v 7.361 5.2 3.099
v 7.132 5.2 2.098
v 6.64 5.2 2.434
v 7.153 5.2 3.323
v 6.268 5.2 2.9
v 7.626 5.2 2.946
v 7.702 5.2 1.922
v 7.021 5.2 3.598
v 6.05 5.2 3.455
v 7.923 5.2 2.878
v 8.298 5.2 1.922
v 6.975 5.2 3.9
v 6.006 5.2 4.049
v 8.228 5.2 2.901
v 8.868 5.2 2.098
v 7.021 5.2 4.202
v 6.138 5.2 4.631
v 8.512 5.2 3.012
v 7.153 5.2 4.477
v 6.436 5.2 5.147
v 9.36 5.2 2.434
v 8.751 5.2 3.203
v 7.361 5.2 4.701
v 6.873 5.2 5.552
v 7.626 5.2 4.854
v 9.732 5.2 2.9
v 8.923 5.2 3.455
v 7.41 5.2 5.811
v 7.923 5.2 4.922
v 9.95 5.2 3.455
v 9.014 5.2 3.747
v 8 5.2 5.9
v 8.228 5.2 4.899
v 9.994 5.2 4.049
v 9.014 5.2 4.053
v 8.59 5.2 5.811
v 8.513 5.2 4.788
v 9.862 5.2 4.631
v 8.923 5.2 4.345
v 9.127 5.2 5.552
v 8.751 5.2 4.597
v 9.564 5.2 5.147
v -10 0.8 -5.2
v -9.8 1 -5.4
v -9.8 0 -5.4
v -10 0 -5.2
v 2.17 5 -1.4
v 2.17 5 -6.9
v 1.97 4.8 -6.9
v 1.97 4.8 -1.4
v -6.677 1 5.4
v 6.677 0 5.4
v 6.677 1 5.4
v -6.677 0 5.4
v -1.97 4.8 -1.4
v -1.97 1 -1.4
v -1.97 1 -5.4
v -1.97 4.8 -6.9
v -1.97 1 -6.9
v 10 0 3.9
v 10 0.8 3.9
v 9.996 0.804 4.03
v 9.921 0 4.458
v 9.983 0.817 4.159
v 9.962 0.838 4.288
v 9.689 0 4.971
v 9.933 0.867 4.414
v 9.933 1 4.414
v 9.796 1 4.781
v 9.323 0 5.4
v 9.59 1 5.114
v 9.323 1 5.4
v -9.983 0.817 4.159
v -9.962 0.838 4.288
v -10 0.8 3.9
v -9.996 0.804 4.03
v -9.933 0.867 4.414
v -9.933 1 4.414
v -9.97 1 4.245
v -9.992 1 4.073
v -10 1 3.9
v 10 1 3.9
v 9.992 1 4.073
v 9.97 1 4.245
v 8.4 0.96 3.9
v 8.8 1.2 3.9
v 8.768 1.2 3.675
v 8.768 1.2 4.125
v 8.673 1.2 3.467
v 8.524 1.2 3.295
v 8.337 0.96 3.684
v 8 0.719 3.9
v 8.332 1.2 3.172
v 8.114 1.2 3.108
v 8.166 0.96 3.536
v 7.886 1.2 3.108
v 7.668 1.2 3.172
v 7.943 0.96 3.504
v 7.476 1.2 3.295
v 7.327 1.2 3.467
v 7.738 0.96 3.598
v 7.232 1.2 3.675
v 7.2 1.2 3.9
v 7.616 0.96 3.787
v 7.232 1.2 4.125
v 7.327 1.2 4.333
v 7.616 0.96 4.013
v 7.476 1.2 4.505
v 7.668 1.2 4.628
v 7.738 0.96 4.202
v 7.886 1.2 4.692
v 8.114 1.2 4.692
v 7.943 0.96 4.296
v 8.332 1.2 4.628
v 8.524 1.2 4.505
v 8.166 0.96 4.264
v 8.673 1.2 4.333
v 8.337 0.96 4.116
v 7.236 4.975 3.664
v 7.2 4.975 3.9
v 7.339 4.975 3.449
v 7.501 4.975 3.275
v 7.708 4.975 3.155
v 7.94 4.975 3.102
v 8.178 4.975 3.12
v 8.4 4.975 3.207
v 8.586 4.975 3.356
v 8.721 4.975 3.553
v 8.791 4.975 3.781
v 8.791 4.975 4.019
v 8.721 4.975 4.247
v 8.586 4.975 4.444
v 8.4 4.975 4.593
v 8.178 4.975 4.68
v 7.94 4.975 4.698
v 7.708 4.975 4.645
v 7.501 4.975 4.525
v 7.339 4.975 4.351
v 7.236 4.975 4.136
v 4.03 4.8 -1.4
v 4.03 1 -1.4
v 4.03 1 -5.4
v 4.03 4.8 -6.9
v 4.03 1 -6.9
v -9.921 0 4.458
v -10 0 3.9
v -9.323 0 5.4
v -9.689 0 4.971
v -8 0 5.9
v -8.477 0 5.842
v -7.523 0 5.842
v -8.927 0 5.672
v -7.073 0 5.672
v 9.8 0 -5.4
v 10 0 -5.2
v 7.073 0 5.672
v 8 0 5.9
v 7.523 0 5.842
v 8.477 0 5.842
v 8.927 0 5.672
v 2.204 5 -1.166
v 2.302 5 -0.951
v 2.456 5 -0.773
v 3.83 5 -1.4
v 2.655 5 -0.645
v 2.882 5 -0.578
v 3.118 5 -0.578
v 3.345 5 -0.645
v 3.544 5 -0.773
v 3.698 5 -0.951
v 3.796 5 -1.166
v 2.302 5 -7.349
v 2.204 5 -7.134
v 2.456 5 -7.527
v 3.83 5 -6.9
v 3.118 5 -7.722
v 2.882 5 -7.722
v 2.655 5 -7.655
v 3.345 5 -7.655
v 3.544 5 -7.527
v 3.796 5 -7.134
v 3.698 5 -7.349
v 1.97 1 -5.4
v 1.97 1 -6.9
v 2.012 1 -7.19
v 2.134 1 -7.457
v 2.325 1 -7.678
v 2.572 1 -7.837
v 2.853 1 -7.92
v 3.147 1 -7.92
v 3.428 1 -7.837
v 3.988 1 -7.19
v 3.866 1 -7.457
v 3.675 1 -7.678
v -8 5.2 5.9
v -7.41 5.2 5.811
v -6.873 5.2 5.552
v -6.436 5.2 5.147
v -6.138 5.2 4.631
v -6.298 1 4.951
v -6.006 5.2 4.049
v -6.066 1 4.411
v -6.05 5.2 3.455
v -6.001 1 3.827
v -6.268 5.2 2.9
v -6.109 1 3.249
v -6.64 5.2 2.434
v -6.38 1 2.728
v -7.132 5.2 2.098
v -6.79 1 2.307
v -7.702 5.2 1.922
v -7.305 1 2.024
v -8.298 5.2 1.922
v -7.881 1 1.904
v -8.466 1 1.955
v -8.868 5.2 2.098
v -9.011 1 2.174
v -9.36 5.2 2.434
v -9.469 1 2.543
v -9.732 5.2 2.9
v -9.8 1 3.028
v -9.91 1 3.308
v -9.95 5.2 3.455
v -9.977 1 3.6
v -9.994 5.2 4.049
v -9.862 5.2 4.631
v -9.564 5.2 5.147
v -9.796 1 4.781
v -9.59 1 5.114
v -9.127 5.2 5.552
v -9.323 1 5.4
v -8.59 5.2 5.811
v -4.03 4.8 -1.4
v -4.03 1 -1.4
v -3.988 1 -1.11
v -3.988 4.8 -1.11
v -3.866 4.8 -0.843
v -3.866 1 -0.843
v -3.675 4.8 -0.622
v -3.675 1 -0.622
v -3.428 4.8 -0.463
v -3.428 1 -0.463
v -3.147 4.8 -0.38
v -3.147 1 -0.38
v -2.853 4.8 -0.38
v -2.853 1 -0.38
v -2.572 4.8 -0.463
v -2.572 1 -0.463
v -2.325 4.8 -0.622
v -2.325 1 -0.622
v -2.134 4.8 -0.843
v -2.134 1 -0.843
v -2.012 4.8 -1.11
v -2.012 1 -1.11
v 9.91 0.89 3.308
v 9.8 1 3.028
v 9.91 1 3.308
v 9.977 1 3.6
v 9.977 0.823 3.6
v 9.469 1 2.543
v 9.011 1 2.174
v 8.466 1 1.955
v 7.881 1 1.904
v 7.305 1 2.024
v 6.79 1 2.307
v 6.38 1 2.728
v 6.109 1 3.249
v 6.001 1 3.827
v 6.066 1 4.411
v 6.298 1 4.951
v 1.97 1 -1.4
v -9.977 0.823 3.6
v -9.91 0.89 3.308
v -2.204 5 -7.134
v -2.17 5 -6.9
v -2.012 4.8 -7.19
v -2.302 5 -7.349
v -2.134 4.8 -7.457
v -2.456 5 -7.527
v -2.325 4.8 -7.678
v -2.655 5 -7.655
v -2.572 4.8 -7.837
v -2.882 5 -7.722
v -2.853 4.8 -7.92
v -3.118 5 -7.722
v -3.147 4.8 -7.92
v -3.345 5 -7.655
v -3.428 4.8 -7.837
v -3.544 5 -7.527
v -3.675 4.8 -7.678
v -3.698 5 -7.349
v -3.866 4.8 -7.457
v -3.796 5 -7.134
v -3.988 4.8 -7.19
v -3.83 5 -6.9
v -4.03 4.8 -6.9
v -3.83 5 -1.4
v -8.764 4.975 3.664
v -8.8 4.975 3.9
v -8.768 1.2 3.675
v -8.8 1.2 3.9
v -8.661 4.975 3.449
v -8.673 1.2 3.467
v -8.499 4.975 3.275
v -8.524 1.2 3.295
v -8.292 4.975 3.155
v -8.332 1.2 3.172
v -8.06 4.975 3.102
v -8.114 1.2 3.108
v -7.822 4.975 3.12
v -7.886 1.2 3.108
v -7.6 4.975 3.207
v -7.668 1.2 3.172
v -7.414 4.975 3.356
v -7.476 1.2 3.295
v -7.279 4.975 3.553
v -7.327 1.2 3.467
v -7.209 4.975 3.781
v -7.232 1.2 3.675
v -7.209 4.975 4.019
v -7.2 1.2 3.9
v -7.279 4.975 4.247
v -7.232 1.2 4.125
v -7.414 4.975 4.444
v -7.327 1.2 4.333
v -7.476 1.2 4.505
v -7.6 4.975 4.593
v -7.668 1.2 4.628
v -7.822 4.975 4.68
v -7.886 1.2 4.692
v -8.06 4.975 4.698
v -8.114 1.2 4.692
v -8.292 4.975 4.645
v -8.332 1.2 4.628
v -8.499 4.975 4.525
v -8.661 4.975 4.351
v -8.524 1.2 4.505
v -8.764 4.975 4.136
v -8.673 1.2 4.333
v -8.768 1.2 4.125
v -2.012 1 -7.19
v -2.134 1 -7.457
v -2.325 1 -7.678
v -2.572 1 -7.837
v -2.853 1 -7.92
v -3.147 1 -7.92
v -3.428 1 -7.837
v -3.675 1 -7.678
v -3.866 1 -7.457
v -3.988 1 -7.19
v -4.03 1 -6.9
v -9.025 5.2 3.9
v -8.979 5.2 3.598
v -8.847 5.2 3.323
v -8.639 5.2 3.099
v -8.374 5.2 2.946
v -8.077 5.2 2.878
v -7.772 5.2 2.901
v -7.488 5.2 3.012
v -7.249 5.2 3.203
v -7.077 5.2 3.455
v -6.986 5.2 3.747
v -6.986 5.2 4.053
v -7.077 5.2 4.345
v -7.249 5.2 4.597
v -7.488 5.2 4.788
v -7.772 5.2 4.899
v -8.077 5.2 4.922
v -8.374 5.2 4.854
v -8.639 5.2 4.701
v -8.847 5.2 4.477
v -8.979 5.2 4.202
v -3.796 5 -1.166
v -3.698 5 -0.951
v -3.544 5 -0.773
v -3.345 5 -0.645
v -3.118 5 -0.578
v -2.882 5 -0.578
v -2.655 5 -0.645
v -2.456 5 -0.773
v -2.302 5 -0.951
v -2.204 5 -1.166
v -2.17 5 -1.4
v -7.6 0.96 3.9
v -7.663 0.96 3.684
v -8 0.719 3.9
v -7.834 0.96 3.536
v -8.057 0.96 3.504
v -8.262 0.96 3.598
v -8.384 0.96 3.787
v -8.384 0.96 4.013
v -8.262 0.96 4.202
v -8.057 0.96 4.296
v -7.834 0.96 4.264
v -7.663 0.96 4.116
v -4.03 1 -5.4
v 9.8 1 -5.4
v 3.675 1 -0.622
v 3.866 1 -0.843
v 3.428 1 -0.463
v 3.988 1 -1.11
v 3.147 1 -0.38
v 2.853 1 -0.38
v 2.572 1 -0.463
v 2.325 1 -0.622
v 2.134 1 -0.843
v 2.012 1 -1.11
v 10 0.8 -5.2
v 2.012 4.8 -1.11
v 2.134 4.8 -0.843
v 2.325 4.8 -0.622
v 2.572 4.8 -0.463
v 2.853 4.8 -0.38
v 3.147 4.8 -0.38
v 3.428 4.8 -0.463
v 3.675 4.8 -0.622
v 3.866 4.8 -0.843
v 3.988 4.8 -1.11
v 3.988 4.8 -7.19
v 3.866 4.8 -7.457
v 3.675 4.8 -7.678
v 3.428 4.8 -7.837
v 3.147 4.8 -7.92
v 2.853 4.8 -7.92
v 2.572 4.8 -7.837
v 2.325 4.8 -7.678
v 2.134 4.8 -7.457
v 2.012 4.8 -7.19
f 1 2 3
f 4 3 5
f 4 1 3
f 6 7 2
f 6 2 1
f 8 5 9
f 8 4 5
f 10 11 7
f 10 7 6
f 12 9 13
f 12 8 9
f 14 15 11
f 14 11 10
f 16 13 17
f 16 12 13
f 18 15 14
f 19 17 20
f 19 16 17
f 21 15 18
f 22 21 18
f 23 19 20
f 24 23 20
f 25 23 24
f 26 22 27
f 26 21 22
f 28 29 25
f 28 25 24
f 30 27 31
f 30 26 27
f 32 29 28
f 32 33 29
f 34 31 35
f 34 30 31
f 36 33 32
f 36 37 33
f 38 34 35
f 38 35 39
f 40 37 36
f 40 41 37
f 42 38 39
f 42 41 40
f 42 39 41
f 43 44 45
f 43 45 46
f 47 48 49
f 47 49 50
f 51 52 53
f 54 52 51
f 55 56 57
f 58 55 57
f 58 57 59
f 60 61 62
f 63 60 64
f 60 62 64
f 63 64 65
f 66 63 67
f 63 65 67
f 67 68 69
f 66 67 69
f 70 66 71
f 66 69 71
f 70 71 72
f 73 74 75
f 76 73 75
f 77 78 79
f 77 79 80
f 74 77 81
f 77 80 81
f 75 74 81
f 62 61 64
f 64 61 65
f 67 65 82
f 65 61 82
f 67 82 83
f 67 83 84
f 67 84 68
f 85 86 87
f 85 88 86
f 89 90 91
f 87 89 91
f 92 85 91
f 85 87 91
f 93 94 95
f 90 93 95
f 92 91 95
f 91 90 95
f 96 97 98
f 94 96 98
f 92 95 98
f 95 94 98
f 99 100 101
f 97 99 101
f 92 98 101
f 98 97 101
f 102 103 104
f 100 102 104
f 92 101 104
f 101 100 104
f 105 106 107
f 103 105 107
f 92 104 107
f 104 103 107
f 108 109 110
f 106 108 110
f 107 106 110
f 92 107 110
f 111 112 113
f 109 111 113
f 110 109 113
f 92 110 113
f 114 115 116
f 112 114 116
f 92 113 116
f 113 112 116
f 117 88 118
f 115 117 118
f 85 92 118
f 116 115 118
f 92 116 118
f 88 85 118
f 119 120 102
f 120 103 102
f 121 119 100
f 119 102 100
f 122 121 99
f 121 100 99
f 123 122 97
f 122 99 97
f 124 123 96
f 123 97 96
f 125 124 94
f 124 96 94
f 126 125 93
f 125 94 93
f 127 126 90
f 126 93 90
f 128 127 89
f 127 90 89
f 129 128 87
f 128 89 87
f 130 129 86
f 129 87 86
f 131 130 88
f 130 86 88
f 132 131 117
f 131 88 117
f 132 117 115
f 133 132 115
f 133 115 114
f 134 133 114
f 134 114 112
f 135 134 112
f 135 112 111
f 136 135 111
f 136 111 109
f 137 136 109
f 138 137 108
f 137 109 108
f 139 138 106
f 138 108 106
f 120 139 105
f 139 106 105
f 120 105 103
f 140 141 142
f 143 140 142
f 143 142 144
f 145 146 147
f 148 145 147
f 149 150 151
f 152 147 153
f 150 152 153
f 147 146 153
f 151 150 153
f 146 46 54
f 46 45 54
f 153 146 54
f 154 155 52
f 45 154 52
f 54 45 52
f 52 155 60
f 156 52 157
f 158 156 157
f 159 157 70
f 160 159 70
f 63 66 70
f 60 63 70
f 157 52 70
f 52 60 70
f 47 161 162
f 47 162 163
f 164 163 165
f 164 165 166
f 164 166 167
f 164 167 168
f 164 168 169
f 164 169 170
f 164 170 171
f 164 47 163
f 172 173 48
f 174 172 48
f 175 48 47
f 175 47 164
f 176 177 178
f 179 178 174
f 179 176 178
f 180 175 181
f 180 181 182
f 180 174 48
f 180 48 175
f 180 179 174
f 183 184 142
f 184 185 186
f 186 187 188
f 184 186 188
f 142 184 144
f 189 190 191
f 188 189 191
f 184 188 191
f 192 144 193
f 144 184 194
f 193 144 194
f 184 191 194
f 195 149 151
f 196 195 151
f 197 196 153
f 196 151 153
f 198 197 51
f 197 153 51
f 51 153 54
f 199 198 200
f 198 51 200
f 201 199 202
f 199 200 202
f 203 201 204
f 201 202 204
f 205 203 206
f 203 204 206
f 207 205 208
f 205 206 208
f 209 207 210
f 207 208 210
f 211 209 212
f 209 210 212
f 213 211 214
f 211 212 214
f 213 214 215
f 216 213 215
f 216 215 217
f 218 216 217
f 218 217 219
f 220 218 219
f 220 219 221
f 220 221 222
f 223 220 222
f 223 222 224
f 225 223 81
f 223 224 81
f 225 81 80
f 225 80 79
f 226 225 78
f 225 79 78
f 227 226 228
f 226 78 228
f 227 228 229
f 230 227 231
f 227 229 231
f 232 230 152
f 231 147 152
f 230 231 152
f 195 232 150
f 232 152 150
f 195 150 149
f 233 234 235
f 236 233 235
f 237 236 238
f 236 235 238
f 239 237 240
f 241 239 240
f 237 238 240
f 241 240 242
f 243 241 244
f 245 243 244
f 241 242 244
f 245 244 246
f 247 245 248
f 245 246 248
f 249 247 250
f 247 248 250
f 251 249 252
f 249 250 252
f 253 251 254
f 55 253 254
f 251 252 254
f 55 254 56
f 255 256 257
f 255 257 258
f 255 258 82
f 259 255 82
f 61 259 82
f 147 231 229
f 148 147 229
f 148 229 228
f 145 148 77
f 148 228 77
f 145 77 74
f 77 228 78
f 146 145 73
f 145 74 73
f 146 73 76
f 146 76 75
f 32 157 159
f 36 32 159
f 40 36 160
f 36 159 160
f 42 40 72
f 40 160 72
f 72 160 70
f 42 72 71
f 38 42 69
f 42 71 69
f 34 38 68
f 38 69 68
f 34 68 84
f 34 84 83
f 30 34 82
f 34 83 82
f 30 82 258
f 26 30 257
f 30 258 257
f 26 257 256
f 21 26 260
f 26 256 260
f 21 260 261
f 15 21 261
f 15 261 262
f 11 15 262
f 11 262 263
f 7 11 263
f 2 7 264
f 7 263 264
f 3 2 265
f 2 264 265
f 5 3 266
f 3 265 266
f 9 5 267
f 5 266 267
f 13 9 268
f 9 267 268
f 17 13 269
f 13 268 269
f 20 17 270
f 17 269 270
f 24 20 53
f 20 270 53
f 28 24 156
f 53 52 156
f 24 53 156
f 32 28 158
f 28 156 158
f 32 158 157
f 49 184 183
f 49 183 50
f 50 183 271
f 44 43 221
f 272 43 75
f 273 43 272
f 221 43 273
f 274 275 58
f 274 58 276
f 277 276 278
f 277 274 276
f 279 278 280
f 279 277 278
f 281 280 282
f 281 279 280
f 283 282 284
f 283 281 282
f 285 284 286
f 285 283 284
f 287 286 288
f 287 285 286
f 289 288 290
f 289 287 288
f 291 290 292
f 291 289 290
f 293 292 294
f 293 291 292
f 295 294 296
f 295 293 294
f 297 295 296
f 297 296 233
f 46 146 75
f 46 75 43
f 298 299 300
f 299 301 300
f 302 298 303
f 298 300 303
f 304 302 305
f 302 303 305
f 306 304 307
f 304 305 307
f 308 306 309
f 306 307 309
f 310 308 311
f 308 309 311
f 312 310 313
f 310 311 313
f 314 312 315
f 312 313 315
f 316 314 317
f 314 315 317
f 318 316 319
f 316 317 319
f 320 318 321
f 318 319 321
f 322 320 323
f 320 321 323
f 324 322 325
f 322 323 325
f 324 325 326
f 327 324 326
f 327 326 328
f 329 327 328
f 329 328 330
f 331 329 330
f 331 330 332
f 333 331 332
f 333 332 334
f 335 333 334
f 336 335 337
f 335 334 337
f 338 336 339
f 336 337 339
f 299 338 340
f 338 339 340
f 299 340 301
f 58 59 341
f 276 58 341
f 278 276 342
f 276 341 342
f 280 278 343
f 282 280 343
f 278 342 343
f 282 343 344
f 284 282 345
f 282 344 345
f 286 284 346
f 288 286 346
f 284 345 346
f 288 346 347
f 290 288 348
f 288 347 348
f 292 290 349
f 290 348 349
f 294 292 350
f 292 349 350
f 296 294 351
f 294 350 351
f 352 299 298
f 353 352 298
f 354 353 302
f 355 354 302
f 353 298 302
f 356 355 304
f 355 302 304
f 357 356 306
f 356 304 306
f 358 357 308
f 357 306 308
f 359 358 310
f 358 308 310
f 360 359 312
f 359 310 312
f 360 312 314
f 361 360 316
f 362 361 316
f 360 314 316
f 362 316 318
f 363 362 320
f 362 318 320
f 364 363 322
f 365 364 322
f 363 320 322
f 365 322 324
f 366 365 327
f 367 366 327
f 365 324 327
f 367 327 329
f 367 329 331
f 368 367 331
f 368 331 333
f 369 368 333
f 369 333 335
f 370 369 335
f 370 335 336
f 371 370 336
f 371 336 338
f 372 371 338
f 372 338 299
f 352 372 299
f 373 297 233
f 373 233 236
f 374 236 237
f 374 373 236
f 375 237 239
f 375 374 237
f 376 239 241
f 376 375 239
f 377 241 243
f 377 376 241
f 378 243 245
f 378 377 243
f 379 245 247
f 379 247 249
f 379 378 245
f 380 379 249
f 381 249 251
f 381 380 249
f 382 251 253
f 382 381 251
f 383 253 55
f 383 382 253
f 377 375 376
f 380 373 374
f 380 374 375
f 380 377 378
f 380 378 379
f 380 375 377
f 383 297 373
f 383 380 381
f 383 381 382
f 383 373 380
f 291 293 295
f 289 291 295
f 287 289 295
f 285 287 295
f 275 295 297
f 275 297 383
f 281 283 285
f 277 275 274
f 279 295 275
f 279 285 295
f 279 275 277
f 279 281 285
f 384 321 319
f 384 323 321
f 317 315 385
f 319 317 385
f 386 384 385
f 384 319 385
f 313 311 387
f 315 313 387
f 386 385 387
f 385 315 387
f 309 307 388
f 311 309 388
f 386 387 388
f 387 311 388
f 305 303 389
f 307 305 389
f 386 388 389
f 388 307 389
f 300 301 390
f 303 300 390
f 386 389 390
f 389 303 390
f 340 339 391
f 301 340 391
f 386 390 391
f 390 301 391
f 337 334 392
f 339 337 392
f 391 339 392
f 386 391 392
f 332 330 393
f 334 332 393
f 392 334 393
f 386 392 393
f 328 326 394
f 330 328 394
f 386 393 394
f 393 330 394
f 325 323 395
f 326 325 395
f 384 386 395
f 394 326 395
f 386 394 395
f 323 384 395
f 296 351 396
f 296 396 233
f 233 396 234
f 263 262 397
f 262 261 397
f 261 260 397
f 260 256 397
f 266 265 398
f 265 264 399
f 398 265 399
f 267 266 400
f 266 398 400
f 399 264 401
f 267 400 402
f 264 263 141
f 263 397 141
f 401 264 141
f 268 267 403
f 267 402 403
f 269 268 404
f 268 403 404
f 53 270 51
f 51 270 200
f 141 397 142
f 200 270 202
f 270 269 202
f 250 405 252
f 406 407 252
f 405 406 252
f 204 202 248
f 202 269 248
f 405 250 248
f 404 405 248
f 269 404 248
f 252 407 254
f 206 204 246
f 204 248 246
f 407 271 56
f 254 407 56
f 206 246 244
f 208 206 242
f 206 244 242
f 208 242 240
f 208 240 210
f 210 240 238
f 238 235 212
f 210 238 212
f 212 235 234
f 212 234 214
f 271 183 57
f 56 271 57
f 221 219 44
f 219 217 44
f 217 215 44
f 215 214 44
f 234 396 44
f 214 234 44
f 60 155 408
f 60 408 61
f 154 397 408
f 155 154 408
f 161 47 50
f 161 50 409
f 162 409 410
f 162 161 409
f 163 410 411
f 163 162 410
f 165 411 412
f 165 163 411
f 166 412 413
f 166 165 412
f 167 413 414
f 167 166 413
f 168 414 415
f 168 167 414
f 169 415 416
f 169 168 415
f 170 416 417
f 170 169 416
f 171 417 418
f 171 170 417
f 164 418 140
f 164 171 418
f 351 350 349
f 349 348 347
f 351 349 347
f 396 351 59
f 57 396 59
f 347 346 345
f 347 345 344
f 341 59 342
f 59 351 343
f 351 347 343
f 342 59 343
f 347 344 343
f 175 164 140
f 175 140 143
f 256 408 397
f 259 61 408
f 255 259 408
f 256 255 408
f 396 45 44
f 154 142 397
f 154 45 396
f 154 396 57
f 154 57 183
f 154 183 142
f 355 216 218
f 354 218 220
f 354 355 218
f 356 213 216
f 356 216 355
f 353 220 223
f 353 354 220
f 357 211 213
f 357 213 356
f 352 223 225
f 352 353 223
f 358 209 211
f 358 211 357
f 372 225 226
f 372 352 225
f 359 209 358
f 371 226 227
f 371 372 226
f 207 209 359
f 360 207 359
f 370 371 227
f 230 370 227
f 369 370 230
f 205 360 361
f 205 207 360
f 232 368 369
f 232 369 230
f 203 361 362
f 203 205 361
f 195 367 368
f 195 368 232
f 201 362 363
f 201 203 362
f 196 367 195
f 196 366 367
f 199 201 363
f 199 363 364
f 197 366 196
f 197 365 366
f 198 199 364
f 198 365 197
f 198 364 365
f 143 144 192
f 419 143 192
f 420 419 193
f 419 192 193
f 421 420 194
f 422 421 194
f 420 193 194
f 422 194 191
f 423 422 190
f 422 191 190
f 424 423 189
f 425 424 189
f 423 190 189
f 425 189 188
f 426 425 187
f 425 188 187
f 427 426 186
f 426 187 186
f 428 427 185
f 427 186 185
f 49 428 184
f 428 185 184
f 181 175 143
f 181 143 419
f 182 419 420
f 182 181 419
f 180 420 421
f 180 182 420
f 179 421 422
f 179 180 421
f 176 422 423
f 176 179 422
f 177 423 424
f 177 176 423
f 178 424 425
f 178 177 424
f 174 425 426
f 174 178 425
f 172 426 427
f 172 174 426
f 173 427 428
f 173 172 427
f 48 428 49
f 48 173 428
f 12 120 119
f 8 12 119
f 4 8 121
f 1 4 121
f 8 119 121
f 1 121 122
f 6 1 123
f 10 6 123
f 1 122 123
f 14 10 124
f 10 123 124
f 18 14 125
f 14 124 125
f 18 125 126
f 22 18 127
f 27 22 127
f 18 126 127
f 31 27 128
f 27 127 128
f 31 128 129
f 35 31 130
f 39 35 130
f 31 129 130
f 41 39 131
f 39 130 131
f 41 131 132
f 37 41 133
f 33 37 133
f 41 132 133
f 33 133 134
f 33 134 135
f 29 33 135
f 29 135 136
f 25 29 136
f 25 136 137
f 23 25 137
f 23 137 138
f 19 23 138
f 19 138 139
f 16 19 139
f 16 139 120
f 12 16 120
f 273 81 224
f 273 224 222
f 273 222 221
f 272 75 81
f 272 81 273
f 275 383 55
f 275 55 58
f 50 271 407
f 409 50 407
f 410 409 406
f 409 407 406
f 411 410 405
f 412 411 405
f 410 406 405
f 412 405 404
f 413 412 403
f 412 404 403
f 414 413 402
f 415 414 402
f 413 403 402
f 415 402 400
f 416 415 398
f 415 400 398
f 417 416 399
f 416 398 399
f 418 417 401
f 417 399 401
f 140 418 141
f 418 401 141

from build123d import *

# Parameters (mm, degrees)
EXTRUDE_1_DEPTH              = 1
EXTRUDE_3_DEPTH              = 4.2
EXTRUDE_3_DEPTH_BACK         = 1
SKETCH_5_R                   = 2.0000000000000004
SKETCH_5_R_2                 = 1.9999999999999996
SKETCH_7_R                   = 1.0299999999999991
EXTRUDE_4_DEPTH              = 4
HOLE_WIZARD_M2_1_D           = 1.6
HOLE_WIZARD_M2_1_DEPTH       = 4
HOLE_WIZARD_M2_1_CSINK_D     = 2.05
HOLE_WIZARD_M2_1_CSINK_ANGLE = 90
HOLE_WIZARD_M2_1_TIP         = 0.48068849522204826
CUT_EXTRUDE_1_DEPTH          = 14.435955492632447
CHAMFER_1_SIZE               = 0.2
CHAMFER_2_SIZE               = 0.2


with BuildPart() as part:
    # 草图1 → 凸台-拉伸1 (new body)
    with BuildSketch(Plane(origin=(0, 0, 0), x_dir=(1, 0, 0), z_dir=(0, 1, 0))):
        Polygon((-10.000000000000002, 5.4), (9.999999999999998, 5.4), (9.999999999999998, -5.4), (-10, -5.4), align=None)
    extrude(amount=EXTRUDE_1_DEPTH)

    # 草图5 → 凸台-拉伸3 (add, two sides: drawn at the far end of the back side and taken through both)
    with BuildSketch(Plane(origin=(0, 1, 0), x_dir=(1, 0, 0), z_dir=(0, 1, 0)).offset(-EXTRUDE_3_DEPTH_BACK)):
        with Locations(Location((-8.000000000000002, -3.900000000000001, 0), (0, 0, 270))):
            Circle(SKETCH_5_R)
        with Locations(Location((7.999999999999998, -3.900000000000001, 0), (0, 0, 270))):
            Circle(SKETCH_5_R_2)
    extrude(amount=EXTRUDE_3_DEPTH + EXTRUDE_3_DEPTH_BACK)

    # 草图7 → 凸台-拉伸4 (add)
    with BuildSketch(Plane(origin=(0, 1, 0), x_dir=(1, 0, 0), z_dir=(0, 1, 0))):
        with BuildLine():
            Line((-1.9700000000000024, 5.4), (-4.030000000000003, 5.4))
            Line((-4.030000000000002, 5.4), (-4.030000000000001, 1.3999999999999986))
            ThreePointArc((-4.030000000000002, 1.3999999999999988), (-3.0000000000000018, 2.429999999999999), (-1.9700000000000017, 1.3999999999999986))
            Line((-1.9700000000000017, 1.3999999999999986), (-1.9700000000000022, 5.4))
        make_face()
        with BuildLine():
            ThreePointArc((-1.9700000000000017, 1.3999999999999986), (-3.0000000000000018, 2.429999999999999), (-4.030000000000002, 1.3999999999999988))
            Line((-4.030000000000001, 1.3999999999999986), (-1.9700000000000015, 1.3999999999999986))
        make_face()
        with BuildLine():
            Line((-1.9700000000000015, 1.3999999999999986), (-4.030000000000001, 1.3999999999999986))
            ThreePointArc((-4.030000000000002, 1.3999999999999988), (-3.0000000000000018, 0.36999999999999855), (-1.9700000000000017, 1.3999999999999984))
        make_face()
        with BuildLine():
            Line((4.029999999999997, 5.4), (1.9699999999999989, 5.4))
            Line((1.9699999999999989, 5.4), (1.9700000000000004, 1.4000000000000021))
            ThreePointArc((1.9699999999999973, 1.400000000000002), (2.9999999999999982, 2.4300000000000024), (4.029999999999999, 1.4000000000000017))
            Line((4.029999999999997, 1.4000000000000021), (4.029999999999997, 5.4))
        make_face()
        with BuildLine():
            ThreePointArc((4.029999999999999, 1.4000000000000017), (2.9999999999999982, 2.4300000000000024), (1.9699999999999973, 1.400000000000002))
            Line((1.9700000000000004, 1.4000000000000015), (4.029999999999997, 1.400000000000002))
        make_face()
        with BuildLine():
            Line((4.029999999999997, 1.400000000000002), (1.9700000000000004, 1.4000000000000015))
            ThreePointArc((1.9699999999999973, 1.400000000000002), (2.9999999999999982, 0.3700000000000008), (4.029999999999999, 1.4000000000000015))
        make_face()
        with BuildLine():
            ThreePointArc((-1.9700000000000022, 6.8999999999999995), (-3.0000000000000013, 5.87), (-4.03, 6.8999999999999995))
            Line((-4.030000000000002, 6.8999999999999995), (-4.030000000000002, 5.4))
            Line((-4.030000000000003, 5.4), (-1.9700000000000024, 5.4))
            Line((-1.9700000000000022, 5.4), (-1.9700000000000024, 6.8999999999999995))
        make_face()
        with Locations((-3.0000000000000013, 6.8999999999999995)):
            Circle(SKETCH_7_R)
        with BuildLine():
            Line((1.9699999999999982, 6.899999999999999), (1.9699999999999989, 5.4))
            Line((1.9699999999999989, 5.4), (4.029999999999997, 5.4))
            Line((4.029999999999997, 5.4), (4.029999999999997, 6.8999999999999995))
            ThreePointArc((4.029999999999998, 6.8999999999999995), (2.9999999999999982, 5.87), (1.969999999999999, 6.8999999999999995))
        make_face()
        with Locations((2.9999999999999982, 6.8999999999999995)):
            Circle(SKETCH_7_R)
    extrude(amount=EXTRUDE_4_DEPTH)

    # M2 螺纹孔1
    with Locations(Plane(origin=(0, 5.200000000000001, 0), x_dir=(1, 0, 0), z_dir=(0, 1, 0))):
        with Locations((-8, -3.9), (8, -3.9)):
            CounterSinkHole(HOLE_WIZARD_M2_1_D / 2, HOLE_WIZARD_M2_1_CSINK_D / 2, depth=HOLE_WIZARD_M2_1_DEPTH, counter_sink_angle=HOLE_WIZARD_M2_1_CSINK_ANGLE)
            with Locations((0, 0, -(HOLE_WIZARD_M2_1_DEPTH + HOLE_WIZARD_M2_1_TIP / 2))):  # 118° drill point
                Cone(0, HOLE_WIZARD_M2_1_D / 2, HOLE_WIZARD_M2_1_TIP, mode=Mode.SUBTRACT)

    # 草图10 → 切除-拉伸1 (cut, through all)
    with BuildSketch(Plane(origin=(0, 1, 0), x_dir=(1, 0, 0), z_dir=(0, 1, 0))):
        with BuildLine():
            Line((-10.000000000000002, -5.3999999999999995), (-9.322875655532316, -5.3999999999999995))
            ThreePointArc((-9.322875655532314, -5.399999999999986), (-9.822875655532302, -4.722875655532286), (-10.000000000000002, -3.9000000000000004))
            Line((-10.000000000000002, -3.900000000000002), (-10.000000000000002, -5.3999999999999995))
        make_face()
        with BuildLine():
            Line((9.322875655532266, -5.3999999999999995), (9.999999999999998, -5.3999999999999995))
            Line((9.999999999999998, -5.3999999999999995), (9.999999999999998, -3.900000000000001))
            ThreePointArc((9.999999999999998, -3.9000000000000012), (9.822875655532286, -4.7228756555323095), (9.322875655532272, -5.400000000000019))
        make_face()
    extrude(amount=-CUT_EXTRUDE_1_DEPTH, mode=Mode.SUBTRACT)

    # 倒角1
    # the kernel refuses this chamfer: 0.2 mm, written as the material it takes off along each edge
    with BuildSketch(Plane(origin=(-10, 1, 4.414336597593362), x_dir=(-0.02749587661058736, -0.9996219169112966, 0), z_dir=(-1.6e-16, 0, -1))) as chamfer_1_piece_1_section:
        Polygon((CHAMFER_1_SIZE * 0.999621916911, -CHAMFER_1_SIZE * 0.0274958766106), (-CHAMFER_1_SIZE * 0.0274958766106, -CHAMFER_1_SIZE * 0.999621916911), (0, 0), align=None)
    chamfer_1_piece_1 = extrude(amount=10.328673195186546, mode=Mode.PRIVATE)
    chamfer_1_piece_1 = chamfer_1_piece_1 - Plane(origin=(-8.000000000000002, 0.9330678370118787, 3.900000000000001), x_dir=(-1.8e-16, 0, 1), z_dir=(0, -1, 0)) * Cylinder(2.0000000000000004, 22, mode=Mode.PRIVATE)
    add(chamfer_1_piece_1, mode=Mode.SUBTRACT)
    with BuildSketch(Plane(origin=(9.999999999999998, 1, -5.9143365975931825), x_dir=(0.02749587661058736, -0.9996219169112966, 0), z_dir=(0, 0, 1))) as chamfer_1_piece_2_section:
        Polygon((CHAMFER_1_SIZE * 0.999621916911, -CHAMFER_1_SIZE * 0.0274958766106), (-CHAMFER_1_SIZE * 0.0274958766106, -CHAMFER_1_SIZE * 0.999621916911), (0, 0), align=None)
    chamfer_1_piece_2 = extrude(amount=10.328673195185887, mode=Mode.PRIVATE)
    chamfer_1_piece_2 = chamfer_1_piece_2 - Plane(origin=(7.999999999999998, 0.9330678369662879, 3.900000000000001), x_dir=(-1.8e-16, 0, 1), z_dir=(0, -1, 0)) * Cylinder(1.9999999999999996, 22, mode=Mode.PRIVATE)
    add(chamfer_1_piece_2, mode=Mode.SUBTRACT)
    with BuildSketch(Plane(origin=(-10.000000000000002, -0.5143365975931808, -5.4), x_dir=(0.9996219169112966, 0, -0.02749587661058742), z_dir=(0, 1, 0))) as chamfer_1_piece_3:
        Polygon((CHAMFER_1_SIZE * 0.999621916911, -CHAMFER_1_SIZE * 0.0274958766106), (-CHAMFER_1_SIZE * 0.0274958766106, -CHAMFER_1_SIZE * 0.999621916911), (0, 0), align=None)
    extrude(amount=2.0286731951863617, mode=Mode.SUBTRACT)
    with BuildSketch(Plane(origin=(9.999999999999998, -0.5143365975931831, -5.4), x_dir=(-0.9996219169112966, 0, -0.02749587661058742), z_dir=(0, 1, 0))) as chamfer_1_piece_4:
        Polygon((CHAMFER_1_SIZE * 0.999621916911, CHAMFER_1_SIZE * 0.0274958766106), (-CHAMFER_1_SIZE * 0.0274958766106, CHAMFER_1_SIZE * 0.999621916911), (0, 0), align=None)
    extrude(amount=2.028673195186366, mode=Mode.SUBTRACT)

    # 倒角2
    chamfer_2_edges = [part.edges().sort_by_distance(p)[0] for p in [
        (-1.970000000000002, 5, -4.149999999999999),
        (-4.030000000000001, 5, -4.149999999999999),
        (-3.000000000000002, 5, -0.3699999999999988),
        (-3.0000000000000013, 5, -7.929999999999999),
        (4.029999999999998, 5, -4.15),
        (1.9699999999999986, 5, -4.15),
        (2.999999999999998, 5, -0.3700000000000008),
        (2.9999999999999982, 5, -7.929999999999999),
    ]]
    chamfer(chamfer_2_edges, length=CHAMFER_2_SIZE)


solid = part.part
